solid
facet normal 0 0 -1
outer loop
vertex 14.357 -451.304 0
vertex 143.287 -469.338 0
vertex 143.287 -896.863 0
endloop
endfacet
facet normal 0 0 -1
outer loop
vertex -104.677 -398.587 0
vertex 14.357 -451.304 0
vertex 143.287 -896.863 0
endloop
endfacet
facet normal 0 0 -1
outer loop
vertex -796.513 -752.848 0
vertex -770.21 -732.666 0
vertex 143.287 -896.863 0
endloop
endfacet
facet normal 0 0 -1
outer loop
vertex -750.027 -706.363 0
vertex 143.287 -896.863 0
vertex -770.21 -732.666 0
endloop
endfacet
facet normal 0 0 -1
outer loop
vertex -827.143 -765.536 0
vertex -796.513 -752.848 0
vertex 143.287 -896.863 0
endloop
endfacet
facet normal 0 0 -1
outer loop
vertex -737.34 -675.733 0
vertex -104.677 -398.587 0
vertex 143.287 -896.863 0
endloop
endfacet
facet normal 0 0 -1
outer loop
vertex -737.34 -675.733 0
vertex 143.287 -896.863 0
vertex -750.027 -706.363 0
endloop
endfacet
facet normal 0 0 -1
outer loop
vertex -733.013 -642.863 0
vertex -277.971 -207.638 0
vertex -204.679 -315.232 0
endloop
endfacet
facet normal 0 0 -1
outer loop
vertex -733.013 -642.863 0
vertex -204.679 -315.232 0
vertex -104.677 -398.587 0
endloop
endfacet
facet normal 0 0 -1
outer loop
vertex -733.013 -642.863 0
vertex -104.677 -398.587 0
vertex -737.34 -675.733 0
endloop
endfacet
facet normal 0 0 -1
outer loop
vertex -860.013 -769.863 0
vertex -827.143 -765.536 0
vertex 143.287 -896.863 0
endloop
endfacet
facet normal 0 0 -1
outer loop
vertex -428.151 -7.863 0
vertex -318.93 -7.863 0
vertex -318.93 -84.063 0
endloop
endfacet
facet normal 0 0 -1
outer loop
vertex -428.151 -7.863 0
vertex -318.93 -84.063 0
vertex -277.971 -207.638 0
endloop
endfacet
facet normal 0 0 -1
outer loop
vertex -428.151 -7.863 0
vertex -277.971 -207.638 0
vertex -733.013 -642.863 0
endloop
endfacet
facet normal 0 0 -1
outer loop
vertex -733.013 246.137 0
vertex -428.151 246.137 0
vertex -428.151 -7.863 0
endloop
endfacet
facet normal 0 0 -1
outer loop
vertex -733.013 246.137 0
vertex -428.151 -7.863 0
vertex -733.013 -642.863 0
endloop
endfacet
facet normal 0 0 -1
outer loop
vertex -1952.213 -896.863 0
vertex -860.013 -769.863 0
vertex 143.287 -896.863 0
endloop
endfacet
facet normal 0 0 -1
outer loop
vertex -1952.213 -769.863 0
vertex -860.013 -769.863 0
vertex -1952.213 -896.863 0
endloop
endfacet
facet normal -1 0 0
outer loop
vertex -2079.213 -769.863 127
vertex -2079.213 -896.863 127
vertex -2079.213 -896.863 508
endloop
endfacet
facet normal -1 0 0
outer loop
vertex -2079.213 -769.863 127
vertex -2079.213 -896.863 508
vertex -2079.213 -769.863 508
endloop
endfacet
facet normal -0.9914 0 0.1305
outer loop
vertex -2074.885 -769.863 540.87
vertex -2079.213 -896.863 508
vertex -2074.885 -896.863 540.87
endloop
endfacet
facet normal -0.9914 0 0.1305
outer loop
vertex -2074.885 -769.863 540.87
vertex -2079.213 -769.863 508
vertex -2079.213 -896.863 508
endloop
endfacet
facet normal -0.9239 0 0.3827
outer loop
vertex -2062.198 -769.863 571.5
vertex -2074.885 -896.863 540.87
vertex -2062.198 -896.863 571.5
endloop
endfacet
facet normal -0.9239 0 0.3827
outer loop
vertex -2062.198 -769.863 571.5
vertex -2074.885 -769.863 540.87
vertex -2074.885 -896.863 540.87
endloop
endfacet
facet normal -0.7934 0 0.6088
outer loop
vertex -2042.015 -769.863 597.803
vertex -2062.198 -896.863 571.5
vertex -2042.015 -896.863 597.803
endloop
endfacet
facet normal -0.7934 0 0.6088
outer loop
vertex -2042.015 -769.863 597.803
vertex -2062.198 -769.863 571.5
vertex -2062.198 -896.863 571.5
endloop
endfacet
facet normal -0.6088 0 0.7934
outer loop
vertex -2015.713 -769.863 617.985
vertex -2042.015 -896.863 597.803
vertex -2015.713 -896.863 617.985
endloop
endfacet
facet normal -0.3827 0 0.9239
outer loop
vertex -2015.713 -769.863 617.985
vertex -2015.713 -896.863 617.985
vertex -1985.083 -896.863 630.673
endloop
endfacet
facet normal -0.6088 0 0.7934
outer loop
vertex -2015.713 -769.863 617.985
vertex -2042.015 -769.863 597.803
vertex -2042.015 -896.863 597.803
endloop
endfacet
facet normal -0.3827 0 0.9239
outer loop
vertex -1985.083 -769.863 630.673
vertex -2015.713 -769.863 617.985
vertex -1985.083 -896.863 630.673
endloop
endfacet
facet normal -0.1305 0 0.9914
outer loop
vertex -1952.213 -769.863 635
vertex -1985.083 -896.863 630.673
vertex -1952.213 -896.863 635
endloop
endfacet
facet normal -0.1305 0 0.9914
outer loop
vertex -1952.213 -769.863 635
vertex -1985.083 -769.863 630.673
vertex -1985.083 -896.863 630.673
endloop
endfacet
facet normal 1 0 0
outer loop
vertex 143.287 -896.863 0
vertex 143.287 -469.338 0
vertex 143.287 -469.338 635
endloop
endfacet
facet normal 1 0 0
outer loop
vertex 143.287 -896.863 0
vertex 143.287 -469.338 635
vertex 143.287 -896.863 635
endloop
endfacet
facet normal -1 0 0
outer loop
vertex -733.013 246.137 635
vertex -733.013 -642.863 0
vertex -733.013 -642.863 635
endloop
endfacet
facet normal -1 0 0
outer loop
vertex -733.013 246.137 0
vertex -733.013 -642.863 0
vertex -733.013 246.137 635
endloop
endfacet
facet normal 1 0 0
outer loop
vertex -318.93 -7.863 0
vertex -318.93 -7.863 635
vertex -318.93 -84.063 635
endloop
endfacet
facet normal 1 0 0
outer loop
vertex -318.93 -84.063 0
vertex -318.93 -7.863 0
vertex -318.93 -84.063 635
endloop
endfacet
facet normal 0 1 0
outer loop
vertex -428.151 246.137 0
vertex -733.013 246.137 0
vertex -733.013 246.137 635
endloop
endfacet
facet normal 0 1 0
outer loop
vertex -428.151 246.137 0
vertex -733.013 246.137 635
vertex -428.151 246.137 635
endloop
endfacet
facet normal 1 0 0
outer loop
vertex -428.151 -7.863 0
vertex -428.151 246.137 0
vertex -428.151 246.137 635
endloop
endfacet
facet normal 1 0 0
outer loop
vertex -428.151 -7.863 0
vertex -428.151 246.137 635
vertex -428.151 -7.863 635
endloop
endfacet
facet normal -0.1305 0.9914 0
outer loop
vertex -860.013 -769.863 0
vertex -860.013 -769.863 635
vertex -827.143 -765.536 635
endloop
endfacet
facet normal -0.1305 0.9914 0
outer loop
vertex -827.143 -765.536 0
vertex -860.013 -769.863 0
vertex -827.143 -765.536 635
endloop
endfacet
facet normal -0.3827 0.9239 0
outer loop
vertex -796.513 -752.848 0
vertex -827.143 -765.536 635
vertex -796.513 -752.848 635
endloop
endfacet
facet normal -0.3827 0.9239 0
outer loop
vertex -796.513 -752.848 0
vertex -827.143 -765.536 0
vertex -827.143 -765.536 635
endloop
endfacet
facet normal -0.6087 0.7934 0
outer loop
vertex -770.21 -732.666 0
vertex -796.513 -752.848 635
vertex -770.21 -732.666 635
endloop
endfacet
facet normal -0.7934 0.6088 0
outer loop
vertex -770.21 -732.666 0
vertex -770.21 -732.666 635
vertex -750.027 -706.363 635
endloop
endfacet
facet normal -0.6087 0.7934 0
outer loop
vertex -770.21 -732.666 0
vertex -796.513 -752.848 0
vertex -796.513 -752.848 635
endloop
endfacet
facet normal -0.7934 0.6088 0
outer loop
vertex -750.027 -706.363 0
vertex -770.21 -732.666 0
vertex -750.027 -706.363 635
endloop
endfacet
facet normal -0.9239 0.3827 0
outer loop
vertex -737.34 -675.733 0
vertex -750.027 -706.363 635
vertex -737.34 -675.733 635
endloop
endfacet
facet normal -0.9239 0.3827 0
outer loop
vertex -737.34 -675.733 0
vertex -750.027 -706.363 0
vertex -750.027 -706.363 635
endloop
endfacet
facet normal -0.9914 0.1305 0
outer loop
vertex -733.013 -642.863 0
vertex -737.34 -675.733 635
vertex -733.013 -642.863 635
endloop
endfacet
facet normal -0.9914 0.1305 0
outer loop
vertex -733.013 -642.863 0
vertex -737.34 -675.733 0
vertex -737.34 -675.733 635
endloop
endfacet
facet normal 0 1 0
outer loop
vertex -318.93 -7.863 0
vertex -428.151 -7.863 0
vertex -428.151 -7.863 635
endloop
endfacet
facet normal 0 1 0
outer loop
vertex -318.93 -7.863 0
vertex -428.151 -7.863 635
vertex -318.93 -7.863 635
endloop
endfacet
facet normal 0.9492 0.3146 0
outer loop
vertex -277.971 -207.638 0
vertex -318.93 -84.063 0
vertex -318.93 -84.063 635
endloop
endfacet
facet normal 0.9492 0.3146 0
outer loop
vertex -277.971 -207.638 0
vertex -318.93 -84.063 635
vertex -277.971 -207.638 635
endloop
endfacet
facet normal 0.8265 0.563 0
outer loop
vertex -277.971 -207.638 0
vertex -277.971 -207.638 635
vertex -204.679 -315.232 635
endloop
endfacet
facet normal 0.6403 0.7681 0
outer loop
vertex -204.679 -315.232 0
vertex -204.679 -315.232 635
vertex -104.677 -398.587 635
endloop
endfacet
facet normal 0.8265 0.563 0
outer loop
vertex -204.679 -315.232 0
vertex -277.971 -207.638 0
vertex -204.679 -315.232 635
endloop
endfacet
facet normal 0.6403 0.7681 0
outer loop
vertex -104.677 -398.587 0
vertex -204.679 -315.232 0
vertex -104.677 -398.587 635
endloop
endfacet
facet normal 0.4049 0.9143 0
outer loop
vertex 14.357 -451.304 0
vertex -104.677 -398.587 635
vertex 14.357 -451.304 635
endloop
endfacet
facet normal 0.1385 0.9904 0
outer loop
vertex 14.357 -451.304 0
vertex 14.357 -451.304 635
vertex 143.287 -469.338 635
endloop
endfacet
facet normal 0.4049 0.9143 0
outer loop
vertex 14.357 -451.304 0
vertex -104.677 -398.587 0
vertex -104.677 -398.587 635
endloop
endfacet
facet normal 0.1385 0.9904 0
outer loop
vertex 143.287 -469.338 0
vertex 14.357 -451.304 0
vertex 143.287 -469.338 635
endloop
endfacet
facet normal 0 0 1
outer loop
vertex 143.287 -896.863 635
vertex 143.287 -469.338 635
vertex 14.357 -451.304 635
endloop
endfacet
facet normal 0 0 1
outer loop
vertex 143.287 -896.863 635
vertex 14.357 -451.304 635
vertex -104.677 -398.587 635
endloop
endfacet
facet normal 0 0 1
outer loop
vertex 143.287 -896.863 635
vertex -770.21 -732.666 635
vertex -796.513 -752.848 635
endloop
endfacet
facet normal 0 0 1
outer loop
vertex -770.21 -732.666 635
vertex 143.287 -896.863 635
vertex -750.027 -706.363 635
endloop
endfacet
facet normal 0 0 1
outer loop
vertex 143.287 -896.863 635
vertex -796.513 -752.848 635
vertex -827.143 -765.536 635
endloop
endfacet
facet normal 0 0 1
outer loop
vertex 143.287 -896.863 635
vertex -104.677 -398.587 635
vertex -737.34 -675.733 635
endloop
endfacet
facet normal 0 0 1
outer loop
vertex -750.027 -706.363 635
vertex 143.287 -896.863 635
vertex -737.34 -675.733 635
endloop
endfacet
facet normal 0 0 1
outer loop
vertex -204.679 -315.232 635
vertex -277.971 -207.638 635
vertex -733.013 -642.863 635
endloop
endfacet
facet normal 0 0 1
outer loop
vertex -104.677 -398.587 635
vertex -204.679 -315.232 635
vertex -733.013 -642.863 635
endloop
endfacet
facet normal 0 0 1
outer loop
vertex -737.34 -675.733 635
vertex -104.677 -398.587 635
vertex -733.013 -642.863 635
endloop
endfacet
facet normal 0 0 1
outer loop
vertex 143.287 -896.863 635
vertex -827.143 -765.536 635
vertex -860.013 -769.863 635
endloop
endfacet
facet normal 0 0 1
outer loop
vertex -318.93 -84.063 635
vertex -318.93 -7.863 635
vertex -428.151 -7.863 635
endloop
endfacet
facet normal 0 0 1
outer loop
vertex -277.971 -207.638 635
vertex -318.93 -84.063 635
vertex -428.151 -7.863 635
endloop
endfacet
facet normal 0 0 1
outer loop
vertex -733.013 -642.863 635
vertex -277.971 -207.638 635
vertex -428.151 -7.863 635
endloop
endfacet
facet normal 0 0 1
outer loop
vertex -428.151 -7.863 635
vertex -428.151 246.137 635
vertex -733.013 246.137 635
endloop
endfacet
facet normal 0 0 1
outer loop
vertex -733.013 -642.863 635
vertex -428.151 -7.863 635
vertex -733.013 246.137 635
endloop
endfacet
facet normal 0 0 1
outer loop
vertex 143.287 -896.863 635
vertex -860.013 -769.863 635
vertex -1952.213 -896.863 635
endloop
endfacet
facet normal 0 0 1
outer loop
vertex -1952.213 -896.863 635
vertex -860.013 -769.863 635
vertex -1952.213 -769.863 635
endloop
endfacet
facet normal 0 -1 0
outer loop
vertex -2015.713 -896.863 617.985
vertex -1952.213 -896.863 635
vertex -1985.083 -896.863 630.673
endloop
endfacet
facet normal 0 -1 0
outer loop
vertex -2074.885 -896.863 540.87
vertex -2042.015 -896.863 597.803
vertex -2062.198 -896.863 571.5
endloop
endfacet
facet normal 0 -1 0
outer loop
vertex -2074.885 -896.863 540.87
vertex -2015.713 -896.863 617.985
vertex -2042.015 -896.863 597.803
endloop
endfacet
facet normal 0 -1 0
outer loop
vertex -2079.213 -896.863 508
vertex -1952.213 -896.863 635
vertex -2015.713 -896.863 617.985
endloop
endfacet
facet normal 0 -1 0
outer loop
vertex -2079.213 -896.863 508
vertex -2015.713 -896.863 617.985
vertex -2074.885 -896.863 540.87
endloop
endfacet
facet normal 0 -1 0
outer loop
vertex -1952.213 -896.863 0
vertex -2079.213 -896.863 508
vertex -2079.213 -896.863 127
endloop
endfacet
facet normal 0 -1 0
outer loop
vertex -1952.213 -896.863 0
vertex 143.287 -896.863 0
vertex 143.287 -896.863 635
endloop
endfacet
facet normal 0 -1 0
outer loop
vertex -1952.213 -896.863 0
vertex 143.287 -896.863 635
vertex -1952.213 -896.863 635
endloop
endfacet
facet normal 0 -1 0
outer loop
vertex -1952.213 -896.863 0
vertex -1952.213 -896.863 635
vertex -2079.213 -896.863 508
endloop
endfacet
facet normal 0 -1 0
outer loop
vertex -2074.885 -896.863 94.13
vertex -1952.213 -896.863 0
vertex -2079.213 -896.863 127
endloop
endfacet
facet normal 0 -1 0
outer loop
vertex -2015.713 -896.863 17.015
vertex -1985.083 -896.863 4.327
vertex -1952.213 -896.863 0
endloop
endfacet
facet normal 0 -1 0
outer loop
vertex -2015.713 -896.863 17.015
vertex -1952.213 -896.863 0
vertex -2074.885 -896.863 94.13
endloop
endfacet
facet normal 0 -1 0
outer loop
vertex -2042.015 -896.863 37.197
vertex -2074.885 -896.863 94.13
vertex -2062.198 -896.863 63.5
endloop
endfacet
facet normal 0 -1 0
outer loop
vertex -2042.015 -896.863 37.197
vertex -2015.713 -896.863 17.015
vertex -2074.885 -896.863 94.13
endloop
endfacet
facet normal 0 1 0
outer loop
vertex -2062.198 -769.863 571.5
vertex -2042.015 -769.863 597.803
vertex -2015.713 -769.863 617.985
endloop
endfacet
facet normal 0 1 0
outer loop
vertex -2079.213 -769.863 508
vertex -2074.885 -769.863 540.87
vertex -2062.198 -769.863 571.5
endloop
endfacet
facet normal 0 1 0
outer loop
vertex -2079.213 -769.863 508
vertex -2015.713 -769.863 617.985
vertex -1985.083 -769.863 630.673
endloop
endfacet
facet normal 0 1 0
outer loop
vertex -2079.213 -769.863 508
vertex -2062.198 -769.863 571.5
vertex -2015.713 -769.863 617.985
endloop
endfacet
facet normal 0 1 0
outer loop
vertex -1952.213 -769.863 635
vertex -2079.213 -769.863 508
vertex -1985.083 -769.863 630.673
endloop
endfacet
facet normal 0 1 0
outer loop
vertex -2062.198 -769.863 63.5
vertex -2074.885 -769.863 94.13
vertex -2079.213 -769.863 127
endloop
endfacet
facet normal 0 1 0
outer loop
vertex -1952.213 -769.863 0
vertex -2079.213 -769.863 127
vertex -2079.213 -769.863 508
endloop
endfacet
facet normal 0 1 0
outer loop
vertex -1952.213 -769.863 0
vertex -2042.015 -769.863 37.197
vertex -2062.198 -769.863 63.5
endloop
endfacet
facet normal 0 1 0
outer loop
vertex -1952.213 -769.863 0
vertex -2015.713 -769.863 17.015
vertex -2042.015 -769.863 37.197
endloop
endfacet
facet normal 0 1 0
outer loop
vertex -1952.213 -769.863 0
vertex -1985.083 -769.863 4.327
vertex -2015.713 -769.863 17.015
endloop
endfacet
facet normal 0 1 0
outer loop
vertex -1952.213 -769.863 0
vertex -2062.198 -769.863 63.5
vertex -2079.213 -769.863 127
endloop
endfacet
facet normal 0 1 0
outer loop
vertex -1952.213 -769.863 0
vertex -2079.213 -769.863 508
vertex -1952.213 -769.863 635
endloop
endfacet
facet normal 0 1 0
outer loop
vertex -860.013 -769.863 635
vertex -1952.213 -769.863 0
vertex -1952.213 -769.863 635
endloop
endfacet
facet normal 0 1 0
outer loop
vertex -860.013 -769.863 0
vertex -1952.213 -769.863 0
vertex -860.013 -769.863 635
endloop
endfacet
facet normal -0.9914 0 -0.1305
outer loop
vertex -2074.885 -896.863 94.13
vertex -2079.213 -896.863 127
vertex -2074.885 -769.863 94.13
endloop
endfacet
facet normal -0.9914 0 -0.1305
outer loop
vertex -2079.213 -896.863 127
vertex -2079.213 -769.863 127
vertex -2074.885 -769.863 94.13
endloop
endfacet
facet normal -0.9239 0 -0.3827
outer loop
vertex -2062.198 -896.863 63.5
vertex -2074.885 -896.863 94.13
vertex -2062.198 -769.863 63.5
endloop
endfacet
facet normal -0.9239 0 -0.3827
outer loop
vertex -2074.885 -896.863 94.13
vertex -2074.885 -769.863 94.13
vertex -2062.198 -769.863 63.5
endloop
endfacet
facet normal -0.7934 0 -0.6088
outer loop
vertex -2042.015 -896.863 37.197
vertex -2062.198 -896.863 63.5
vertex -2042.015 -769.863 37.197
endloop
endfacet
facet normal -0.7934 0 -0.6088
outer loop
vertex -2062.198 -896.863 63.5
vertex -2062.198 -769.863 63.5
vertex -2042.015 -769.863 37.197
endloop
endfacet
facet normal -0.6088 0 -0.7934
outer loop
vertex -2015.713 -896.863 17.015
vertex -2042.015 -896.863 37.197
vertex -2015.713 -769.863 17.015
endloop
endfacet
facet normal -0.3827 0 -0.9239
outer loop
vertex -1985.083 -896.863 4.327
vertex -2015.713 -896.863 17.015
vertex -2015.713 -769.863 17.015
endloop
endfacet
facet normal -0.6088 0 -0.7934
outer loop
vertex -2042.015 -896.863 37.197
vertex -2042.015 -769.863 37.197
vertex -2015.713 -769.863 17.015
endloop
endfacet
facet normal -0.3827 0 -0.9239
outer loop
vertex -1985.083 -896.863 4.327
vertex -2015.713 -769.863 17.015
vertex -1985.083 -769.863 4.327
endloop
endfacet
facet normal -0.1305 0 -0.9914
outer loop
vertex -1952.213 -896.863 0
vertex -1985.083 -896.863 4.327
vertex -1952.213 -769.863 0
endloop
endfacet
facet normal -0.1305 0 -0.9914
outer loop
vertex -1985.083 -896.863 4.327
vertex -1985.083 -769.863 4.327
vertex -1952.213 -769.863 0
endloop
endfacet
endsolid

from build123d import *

# Parameters (mm, degrees)
BOSS_EXTRUDE1_DEPTH = 635
FILLET5_R           = 127
FILLET6_R           = 127


with BuildPart() as part:
    # Sketch3 → Boss-Extrude1 (new body)
    with BuildSketch(Plane.XY):
        with BuildLine():
            Line((-2079.212661728, -769.863228), (-860.012661728, -769.863228))
            ThreePointArc((-860.012661728, -769.863228), (-770.210100518, -732.665789211), (-733.012661728, -642.863228))
            Line((-733.012661728, -642.863228), (-733.012661728, 246.136772))
            Line((-733.012661728, 246.136772), (-428.150553924, 246.136772))
            Line((-428.150553924, 246.136772), (-428.150553924, -7.863228))
            Line((-428.150553924, -7.863228), (-326.612661728, -7.863228))
            Line((-326.612661728, -7.863228), (-318.929679791, -7.863228))
            Line((-318.929679791, -7.863228), (-318.929679791, -84.063228))
            ThreePointArc((-318.929679791, -84.063228), (-157.578570713, -360.389072068), (143.287338272, -469.33794683))
            Line((143.287338272, -469.33794683), (143.287338272, -896.863228))
            Line((143.287338272, -896.863228), (-2079.212661728, -896.863228))
            Line((-2079.212661728, -896.863228), (-2079.212661728, -769.863228))
        make_face()
    extrude(amount=BOSS_EXTRUDE1_DEPTH)

    # Fillet5
    fillet5_edges = [part.edges().sort_by_distance(p)[0] for p in [
        (-2079.212661728, -833.363228, 635),
    ]]
    fillet(fillet5_edges, radius=FILLET5_R)

    # Fillet6
    fillet6_edges = [part.edges().sort_by_distance(p)[0] for p in [
        (-2079.212661728, -833.363228, 0),
    ]]
    fillet(fillet6_edges, radius=FILLET6_R)


solid = part.part
